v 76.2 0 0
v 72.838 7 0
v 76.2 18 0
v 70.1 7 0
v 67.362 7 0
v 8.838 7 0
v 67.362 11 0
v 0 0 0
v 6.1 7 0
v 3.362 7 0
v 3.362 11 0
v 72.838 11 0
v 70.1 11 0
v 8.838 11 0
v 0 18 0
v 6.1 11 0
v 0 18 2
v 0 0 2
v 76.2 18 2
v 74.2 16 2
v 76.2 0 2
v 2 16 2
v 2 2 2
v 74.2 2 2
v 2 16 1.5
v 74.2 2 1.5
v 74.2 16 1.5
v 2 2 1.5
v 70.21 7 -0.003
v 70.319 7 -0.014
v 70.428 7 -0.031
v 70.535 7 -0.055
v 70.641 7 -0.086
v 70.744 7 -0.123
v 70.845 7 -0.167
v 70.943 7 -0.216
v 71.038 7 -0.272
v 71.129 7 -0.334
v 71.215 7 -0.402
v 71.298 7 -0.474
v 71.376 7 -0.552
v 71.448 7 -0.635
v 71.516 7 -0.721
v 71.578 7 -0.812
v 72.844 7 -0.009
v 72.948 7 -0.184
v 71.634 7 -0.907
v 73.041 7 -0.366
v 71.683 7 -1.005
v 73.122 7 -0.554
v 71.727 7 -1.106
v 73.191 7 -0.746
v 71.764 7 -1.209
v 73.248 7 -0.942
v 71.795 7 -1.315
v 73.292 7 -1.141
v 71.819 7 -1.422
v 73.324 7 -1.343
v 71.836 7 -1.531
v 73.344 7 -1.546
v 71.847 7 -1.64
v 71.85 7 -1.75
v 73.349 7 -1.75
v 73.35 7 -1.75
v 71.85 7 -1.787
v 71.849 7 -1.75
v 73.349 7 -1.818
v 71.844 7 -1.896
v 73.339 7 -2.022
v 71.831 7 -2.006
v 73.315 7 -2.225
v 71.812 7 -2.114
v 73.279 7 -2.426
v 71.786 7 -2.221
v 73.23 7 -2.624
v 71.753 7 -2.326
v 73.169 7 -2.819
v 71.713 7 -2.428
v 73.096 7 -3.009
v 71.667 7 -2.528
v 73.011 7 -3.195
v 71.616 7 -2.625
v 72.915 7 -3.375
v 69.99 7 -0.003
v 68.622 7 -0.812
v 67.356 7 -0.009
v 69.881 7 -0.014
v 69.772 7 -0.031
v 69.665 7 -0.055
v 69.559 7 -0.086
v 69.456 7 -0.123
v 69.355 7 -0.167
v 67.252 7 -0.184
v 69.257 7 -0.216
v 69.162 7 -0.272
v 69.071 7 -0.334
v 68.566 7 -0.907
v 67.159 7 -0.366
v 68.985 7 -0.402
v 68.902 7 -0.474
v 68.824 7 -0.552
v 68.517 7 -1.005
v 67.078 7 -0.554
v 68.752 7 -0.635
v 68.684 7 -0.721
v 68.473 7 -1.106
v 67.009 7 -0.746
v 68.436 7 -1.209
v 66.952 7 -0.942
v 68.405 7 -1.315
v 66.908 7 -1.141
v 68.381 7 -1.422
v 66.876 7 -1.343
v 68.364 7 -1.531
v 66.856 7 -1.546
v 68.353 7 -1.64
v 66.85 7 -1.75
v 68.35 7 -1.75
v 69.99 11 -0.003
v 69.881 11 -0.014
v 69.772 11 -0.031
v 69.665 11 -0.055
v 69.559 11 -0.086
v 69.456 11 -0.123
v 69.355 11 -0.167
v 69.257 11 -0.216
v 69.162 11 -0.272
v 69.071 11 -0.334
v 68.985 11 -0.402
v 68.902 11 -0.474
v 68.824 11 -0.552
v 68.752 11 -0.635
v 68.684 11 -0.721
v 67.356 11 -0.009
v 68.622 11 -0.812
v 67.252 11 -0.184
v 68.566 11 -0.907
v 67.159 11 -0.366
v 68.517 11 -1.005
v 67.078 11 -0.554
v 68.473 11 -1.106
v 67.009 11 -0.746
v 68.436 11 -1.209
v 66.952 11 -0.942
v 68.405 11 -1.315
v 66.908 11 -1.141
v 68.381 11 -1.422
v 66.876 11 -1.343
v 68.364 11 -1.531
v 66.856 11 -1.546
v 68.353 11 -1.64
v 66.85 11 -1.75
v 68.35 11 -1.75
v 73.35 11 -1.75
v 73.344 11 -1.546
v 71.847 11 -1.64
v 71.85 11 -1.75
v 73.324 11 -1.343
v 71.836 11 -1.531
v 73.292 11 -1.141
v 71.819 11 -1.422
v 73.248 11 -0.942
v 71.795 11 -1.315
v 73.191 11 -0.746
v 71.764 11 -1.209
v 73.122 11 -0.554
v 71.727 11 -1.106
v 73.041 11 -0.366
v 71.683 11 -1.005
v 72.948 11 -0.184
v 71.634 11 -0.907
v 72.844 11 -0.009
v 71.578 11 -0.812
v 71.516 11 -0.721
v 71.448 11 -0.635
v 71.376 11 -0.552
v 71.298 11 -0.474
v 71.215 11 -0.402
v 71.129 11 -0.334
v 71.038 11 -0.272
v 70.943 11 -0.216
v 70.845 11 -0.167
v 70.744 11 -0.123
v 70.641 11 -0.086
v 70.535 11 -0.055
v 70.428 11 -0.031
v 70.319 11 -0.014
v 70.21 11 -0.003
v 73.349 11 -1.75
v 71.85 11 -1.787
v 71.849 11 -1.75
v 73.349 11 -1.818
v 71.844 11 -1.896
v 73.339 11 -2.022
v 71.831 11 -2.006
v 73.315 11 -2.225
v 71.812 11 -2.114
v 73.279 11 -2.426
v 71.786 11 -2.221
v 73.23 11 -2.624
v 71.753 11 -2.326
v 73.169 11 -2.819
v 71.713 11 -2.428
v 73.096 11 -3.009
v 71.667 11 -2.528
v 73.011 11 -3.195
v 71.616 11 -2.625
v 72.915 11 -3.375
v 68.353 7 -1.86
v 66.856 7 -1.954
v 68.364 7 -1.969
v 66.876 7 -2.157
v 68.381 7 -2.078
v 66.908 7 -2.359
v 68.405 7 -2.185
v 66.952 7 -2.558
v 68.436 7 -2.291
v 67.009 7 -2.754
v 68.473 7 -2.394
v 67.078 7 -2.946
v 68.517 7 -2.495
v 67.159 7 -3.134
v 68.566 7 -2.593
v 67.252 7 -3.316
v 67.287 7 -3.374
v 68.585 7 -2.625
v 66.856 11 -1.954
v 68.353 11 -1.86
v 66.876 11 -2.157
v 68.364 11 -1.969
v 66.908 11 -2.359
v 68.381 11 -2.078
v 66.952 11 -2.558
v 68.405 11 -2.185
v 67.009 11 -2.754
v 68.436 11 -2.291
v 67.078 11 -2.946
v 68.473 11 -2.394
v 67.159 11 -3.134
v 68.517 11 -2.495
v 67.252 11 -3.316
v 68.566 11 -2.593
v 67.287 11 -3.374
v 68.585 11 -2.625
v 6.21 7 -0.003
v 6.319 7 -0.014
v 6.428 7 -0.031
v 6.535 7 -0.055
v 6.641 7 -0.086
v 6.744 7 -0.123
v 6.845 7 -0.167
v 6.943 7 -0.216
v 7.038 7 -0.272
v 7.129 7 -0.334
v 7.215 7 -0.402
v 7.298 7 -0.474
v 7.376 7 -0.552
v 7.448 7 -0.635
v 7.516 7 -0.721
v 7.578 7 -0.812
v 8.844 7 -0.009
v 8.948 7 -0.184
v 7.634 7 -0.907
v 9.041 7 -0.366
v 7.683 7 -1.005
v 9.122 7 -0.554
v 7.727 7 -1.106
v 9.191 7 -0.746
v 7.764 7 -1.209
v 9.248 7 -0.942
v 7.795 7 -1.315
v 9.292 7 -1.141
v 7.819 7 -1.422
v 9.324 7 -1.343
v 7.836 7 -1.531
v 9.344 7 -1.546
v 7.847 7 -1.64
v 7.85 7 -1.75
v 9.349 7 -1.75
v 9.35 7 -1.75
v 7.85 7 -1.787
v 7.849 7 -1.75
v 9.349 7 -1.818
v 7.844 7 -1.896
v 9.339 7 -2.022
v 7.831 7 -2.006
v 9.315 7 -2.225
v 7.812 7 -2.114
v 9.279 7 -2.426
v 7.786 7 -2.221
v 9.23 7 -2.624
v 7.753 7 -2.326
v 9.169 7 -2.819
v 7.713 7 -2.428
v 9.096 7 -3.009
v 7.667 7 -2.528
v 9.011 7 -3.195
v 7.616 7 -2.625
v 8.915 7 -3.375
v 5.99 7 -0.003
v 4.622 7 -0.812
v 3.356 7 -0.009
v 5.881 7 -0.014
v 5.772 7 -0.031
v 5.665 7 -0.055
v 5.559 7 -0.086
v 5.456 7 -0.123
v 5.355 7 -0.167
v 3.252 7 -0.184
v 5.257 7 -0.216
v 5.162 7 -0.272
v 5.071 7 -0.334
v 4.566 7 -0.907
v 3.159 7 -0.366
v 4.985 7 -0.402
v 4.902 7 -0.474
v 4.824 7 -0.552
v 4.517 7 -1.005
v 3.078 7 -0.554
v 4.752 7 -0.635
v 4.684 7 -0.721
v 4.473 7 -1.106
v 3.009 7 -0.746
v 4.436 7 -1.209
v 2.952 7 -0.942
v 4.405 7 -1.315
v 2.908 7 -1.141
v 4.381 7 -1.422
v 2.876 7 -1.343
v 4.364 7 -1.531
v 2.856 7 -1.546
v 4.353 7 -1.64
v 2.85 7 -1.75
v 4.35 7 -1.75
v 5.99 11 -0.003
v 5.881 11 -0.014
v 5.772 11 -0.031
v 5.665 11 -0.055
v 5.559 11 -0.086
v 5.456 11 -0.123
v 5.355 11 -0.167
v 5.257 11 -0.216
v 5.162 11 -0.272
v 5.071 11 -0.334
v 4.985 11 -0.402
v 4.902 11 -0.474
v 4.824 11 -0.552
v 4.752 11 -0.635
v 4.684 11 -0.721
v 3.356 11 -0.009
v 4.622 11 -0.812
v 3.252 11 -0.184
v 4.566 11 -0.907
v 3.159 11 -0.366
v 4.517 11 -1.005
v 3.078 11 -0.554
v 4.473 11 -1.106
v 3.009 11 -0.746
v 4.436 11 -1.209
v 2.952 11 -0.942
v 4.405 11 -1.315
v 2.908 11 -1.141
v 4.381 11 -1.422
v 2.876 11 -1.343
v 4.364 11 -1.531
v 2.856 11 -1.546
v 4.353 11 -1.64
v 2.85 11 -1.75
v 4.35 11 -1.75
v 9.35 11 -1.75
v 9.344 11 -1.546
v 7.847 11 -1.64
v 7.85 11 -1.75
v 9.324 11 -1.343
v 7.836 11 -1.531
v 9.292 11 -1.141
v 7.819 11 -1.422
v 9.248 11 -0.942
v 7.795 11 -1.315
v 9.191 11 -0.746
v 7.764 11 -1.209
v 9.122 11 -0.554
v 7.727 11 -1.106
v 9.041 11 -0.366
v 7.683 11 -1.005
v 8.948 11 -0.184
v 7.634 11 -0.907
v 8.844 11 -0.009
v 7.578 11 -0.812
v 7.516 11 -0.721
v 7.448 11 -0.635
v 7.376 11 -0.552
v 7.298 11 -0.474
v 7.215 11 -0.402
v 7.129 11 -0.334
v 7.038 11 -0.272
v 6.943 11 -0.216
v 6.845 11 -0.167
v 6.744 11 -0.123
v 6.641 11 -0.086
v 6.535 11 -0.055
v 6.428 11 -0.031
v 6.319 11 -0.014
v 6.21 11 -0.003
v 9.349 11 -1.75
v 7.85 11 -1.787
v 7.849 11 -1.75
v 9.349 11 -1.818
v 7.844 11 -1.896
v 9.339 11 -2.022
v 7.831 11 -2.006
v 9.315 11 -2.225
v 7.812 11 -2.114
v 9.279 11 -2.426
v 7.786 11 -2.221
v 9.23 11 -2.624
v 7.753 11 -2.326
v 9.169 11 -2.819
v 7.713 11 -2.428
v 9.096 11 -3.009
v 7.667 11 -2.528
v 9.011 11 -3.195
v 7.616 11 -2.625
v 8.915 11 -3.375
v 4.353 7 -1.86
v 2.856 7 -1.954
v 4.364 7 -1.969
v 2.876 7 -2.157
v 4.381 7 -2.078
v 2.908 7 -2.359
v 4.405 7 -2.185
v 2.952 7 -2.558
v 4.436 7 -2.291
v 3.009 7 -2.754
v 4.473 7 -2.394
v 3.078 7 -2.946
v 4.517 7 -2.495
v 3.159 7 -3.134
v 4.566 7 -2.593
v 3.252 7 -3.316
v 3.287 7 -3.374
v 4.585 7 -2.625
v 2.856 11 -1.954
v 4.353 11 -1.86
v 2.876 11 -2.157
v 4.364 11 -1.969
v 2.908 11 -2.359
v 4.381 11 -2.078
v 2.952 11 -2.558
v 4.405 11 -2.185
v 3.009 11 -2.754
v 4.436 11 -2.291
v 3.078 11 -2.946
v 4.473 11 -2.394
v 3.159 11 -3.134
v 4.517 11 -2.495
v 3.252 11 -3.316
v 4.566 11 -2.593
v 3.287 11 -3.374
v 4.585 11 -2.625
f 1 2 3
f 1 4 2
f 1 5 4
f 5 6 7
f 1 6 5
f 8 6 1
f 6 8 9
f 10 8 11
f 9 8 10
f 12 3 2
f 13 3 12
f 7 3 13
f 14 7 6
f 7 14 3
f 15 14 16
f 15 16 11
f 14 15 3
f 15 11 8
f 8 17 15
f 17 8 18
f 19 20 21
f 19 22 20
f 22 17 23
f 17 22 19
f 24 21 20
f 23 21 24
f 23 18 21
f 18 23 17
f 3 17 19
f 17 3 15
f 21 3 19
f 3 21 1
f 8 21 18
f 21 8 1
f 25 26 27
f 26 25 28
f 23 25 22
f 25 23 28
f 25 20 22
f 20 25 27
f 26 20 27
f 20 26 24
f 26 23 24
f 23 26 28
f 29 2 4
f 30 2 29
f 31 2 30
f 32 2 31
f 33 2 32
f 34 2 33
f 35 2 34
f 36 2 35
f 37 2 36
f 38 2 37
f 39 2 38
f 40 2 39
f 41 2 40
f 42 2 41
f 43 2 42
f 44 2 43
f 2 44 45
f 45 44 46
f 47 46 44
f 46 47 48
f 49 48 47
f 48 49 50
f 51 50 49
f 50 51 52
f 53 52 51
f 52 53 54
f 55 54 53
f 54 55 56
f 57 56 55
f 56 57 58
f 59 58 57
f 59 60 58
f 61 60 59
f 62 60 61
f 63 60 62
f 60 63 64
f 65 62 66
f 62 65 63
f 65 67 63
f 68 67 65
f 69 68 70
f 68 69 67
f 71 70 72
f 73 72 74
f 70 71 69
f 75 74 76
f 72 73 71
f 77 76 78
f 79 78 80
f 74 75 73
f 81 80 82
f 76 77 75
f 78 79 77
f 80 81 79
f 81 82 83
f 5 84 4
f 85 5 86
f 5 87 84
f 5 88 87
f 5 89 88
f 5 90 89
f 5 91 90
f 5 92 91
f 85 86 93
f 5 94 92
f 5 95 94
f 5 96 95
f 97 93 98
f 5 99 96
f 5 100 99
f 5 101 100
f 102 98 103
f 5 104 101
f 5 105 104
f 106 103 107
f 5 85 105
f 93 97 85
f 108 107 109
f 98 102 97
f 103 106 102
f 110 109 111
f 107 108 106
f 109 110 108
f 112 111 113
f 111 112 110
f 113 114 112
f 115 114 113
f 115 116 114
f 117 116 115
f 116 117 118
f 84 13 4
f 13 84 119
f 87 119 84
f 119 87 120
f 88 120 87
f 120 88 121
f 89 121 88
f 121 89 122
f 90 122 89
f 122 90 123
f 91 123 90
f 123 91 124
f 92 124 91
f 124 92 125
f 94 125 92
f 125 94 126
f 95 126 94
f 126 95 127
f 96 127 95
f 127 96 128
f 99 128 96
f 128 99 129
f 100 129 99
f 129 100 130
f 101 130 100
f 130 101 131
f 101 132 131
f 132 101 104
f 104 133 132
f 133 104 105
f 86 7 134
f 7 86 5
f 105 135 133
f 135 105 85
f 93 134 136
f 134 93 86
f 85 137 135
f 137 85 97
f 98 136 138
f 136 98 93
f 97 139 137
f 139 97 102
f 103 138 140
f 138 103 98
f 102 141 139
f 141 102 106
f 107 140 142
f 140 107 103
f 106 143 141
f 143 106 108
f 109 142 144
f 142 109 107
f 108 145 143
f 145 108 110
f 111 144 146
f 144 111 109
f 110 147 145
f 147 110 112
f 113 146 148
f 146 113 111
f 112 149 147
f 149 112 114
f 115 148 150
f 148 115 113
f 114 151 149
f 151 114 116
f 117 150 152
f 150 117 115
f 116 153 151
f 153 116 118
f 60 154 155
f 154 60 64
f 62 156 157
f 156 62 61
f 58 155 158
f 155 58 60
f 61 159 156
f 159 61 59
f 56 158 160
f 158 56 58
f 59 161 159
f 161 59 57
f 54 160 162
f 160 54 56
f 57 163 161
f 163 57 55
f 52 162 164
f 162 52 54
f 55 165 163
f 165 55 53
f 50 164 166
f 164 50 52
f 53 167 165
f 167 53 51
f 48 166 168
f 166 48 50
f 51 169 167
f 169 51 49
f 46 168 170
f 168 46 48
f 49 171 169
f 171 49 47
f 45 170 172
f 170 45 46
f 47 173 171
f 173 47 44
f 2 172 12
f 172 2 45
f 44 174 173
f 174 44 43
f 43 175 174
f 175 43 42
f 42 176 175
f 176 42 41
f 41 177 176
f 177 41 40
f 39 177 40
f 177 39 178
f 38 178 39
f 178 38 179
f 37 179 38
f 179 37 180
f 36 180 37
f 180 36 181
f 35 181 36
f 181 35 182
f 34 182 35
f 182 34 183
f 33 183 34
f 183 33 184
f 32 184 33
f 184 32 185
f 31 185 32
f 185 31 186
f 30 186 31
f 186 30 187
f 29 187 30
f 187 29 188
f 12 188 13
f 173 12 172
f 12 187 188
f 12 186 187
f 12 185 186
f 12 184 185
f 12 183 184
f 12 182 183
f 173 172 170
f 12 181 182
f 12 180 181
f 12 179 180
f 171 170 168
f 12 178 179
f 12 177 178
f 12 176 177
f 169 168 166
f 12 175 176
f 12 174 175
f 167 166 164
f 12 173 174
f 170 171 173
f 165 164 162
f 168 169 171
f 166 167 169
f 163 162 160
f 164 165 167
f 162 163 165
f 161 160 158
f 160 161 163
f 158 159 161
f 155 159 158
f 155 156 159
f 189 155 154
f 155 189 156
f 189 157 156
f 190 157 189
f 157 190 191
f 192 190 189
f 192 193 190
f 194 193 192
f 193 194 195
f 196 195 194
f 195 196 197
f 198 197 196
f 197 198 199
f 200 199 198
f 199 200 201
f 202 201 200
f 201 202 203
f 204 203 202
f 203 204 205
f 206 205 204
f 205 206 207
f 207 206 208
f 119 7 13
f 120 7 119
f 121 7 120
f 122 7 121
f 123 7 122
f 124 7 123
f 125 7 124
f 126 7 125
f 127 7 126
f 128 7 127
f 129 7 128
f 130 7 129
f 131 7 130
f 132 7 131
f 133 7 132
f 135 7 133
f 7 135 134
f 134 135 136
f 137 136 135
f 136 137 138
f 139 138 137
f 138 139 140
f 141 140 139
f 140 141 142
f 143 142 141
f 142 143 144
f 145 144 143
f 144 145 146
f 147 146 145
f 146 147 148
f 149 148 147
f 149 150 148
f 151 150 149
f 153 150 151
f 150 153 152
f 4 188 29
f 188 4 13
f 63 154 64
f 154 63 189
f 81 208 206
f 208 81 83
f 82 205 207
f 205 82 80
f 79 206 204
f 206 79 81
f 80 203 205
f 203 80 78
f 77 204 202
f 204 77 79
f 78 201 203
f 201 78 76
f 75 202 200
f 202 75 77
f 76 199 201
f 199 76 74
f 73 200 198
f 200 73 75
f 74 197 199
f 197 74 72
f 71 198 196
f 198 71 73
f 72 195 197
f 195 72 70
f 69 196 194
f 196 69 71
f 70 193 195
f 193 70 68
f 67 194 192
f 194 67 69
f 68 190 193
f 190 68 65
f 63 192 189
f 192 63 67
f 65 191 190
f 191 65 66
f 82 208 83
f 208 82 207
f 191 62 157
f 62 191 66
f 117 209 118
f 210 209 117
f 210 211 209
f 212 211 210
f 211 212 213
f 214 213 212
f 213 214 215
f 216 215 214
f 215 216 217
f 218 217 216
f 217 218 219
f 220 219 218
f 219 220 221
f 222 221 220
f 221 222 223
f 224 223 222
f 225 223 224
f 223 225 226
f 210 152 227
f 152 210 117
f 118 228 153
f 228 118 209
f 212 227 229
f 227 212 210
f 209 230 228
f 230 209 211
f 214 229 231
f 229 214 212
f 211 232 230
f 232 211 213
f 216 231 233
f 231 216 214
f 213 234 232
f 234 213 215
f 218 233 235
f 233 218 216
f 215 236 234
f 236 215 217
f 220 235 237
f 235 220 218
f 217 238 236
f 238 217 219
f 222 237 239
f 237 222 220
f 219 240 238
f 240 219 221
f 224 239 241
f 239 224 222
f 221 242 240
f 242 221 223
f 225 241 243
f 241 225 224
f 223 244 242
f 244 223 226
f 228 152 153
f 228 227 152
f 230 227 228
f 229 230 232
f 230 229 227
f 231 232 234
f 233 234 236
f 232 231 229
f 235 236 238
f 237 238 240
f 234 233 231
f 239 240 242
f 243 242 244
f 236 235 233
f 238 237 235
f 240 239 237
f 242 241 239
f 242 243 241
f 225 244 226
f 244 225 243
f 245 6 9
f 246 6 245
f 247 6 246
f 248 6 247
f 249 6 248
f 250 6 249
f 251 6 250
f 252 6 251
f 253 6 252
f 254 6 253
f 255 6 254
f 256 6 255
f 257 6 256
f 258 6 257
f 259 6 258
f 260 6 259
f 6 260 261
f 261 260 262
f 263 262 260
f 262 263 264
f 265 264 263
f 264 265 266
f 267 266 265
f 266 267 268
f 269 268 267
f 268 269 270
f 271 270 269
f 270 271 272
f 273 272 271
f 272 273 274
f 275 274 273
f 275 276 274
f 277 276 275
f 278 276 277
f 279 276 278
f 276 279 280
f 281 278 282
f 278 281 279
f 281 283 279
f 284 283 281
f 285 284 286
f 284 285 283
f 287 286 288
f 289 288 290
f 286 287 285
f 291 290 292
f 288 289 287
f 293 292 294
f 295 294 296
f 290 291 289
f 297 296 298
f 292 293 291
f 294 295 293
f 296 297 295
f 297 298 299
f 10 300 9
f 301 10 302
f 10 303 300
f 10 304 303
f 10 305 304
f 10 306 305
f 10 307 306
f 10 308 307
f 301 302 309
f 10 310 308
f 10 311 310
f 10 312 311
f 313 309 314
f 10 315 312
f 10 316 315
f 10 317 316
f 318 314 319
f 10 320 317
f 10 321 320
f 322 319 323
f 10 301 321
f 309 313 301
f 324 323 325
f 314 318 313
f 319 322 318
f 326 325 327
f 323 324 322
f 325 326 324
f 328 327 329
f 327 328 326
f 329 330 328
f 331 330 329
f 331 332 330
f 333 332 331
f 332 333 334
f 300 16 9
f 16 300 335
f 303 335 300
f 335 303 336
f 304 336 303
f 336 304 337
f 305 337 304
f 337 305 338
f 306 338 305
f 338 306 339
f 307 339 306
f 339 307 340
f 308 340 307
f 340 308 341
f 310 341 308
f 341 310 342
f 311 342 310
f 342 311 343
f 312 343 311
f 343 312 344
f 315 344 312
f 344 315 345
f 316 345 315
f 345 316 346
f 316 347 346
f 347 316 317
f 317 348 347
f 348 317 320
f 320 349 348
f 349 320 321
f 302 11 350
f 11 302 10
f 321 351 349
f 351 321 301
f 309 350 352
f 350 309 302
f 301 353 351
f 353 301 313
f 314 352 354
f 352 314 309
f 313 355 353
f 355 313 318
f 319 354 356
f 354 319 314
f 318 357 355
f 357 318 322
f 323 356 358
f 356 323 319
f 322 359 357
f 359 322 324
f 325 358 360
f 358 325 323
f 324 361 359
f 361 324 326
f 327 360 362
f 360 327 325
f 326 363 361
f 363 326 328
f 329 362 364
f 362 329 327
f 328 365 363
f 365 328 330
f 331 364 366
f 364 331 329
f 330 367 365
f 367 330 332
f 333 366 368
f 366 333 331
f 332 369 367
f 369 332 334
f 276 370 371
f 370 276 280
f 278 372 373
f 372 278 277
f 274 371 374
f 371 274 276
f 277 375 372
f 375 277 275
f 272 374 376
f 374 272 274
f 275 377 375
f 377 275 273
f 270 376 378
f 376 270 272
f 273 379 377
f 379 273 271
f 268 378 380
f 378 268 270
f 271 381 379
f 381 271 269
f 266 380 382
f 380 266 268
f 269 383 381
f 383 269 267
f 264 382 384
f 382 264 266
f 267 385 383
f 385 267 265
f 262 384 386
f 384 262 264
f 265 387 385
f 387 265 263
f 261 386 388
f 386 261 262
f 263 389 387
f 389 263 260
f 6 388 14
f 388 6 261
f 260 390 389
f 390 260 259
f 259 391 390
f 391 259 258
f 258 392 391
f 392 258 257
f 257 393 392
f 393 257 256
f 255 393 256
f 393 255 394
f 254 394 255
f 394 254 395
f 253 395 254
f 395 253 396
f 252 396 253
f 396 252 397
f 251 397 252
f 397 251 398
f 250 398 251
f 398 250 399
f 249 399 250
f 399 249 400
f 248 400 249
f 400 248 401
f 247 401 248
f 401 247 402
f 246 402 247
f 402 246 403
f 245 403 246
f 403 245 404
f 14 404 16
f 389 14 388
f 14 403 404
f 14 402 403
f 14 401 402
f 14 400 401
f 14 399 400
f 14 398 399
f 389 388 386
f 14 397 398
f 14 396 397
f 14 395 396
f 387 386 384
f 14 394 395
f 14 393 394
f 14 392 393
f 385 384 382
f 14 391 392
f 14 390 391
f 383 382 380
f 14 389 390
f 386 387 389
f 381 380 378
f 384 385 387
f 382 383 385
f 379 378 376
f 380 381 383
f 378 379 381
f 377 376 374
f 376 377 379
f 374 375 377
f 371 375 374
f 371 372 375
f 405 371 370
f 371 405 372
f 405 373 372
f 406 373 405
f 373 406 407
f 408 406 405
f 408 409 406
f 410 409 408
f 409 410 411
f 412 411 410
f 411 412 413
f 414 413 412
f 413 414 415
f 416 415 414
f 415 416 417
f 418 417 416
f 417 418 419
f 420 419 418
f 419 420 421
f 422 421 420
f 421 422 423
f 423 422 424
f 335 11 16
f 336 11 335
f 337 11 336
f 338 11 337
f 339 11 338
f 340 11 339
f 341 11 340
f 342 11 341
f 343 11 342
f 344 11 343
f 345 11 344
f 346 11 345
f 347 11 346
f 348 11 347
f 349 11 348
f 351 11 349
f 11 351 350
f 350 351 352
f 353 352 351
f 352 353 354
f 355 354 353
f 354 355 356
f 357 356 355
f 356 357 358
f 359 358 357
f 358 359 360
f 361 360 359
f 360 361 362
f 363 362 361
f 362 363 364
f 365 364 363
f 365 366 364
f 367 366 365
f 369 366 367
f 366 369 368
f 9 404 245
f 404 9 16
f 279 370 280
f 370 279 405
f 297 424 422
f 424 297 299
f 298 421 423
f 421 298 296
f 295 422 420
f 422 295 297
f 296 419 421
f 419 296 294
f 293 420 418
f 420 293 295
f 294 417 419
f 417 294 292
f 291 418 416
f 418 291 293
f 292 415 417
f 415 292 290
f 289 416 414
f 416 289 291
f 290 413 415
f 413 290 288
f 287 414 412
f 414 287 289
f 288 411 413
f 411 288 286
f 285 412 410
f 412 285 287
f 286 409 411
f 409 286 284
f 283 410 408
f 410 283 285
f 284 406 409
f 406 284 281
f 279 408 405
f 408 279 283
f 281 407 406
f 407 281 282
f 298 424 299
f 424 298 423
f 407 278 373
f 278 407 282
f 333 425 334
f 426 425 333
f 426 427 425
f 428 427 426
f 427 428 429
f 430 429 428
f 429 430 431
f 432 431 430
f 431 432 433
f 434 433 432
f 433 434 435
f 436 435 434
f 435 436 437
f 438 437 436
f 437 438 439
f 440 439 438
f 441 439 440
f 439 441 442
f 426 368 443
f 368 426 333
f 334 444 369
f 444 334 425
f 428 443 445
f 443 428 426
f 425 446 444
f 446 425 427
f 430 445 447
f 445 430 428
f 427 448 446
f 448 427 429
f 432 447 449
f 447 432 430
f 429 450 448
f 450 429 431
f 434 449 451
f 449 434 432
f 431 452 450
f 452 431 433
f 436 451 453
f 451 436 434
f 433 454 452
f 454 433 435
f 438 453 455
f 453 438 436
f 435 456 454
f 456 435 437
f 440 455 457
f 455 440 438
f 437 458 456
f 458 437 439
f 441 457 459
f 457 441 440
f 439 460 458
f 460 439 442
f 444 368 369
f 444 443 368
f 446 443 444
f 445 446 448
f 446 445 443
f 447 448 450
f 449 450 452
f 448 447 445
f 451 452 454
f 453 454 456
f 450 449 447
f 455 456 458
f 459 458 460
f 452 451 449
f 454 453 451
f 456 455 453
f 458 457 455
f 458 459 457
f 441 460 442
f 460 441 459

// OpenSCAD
//Width of the clip (mm)
width = 76.2;  // label width (mm)

//Height of the label maker tape (standard Brother is 12 mm)
label_ht = 12; //standard size is 12 mm for a Brother Label

ridge = 2*1; //width of the ridge around the label
height = label_ht + 2* ridge + 2; // 1 mm for top and bottom and additional for ridge
thickness = 2*1; //thickness (mm) of the plate
clip_width = 4*1;
clip_spacing = 16*1;
wire_diameter = 3.5*1; // ClosetMaid standard width is 3.4 mm (#10 BWG) (0.1 mm for tolerance)
wall_thickness = 1.5*1; // wall thickness of clip (mm)



//establish the number of wires to maximize the spacing of the clips
spacing = floor(width/clip_spacing);

num_wire_spacing = spacing > (width -2*(wire_diameter/2+wall_thickness))/clip_spacing ? spacing -1 : spacing;


//combine the clip and plate
union(){
//create the plate for the label
difference(){
linear_extrude(height = thickness) square([width,height]);
translate([ridge,ridge,thickness -0.5]) linear_extrude(height=0.5) square([width-ridge*2,height-ridge*2]);
}


//create the dual clips
translate([(width-clip_spacing*num_wire_spacing)/2,0,0]) union(){
translate([num_wire_spacing*clip_spacing,(height-clip_width)/2,thickness-0.5]) rotate([0,90,90]) standard_clip(clip_spacing, clip_width, wire_diameter, wall_thickness);

translate([0,(height-clip_width)/2,thickness-0.5]) rotate([0,90,90]) standard_clip(clip_spacing, clip_width, wire_diameter, wall_thickness);
}

}






//create a standard clip
module standard_clip(clip_spacing, clip_width, wire_diameter, wall_thickness){

translate([wire_diameter/2+wall_thickness,0,0]) union(){
arc(wall_thickness,clip_width,wire_diameter/2+wall_thickness,180);
rotate([0,0,30]) arc(wall_thickness,clip_width,wire_diameter/2+wall_thickness,30);
rotate([0,0,180]) arc(wall_thickness,clip_width,wire_diameter/2+wall_thickness,30);
}
}




















/* 
 * Excerpt from... 
 * 
 * Parametric Encoder Wheel 
 *
 * by Alex Franke (codecreations), March 2012
 * http://www.theFrankes.com
 * 
 * Licenced under Creative Commons Attribution - Non-Commercial - Share Alike 3.0 
*/
 
module arc( height, depth, radius, degrees ) {
    // This dies a horible death if it's not rendered here 
    // -- sucks up all memory and spins out of control 
    render() {
        difference() {
            // Outer ring
            rotate_extrude($fn = 100)
                translate([radius - height, 0, 0])
                    square([height,depth]);
         
            // Cut half off
            translate([0,-(radius+1),-.5]) 
                cube ([radius+1,(radius+1)*2,depth+1]);
         
            // Cover the other half as necessary
            rotate([0,0,180-degrees])
            translate([0,-(radius+1),-.5]) 
                cube ([radius+1,(radius+1)*2,depth+1]);
         
        }
    }
}
